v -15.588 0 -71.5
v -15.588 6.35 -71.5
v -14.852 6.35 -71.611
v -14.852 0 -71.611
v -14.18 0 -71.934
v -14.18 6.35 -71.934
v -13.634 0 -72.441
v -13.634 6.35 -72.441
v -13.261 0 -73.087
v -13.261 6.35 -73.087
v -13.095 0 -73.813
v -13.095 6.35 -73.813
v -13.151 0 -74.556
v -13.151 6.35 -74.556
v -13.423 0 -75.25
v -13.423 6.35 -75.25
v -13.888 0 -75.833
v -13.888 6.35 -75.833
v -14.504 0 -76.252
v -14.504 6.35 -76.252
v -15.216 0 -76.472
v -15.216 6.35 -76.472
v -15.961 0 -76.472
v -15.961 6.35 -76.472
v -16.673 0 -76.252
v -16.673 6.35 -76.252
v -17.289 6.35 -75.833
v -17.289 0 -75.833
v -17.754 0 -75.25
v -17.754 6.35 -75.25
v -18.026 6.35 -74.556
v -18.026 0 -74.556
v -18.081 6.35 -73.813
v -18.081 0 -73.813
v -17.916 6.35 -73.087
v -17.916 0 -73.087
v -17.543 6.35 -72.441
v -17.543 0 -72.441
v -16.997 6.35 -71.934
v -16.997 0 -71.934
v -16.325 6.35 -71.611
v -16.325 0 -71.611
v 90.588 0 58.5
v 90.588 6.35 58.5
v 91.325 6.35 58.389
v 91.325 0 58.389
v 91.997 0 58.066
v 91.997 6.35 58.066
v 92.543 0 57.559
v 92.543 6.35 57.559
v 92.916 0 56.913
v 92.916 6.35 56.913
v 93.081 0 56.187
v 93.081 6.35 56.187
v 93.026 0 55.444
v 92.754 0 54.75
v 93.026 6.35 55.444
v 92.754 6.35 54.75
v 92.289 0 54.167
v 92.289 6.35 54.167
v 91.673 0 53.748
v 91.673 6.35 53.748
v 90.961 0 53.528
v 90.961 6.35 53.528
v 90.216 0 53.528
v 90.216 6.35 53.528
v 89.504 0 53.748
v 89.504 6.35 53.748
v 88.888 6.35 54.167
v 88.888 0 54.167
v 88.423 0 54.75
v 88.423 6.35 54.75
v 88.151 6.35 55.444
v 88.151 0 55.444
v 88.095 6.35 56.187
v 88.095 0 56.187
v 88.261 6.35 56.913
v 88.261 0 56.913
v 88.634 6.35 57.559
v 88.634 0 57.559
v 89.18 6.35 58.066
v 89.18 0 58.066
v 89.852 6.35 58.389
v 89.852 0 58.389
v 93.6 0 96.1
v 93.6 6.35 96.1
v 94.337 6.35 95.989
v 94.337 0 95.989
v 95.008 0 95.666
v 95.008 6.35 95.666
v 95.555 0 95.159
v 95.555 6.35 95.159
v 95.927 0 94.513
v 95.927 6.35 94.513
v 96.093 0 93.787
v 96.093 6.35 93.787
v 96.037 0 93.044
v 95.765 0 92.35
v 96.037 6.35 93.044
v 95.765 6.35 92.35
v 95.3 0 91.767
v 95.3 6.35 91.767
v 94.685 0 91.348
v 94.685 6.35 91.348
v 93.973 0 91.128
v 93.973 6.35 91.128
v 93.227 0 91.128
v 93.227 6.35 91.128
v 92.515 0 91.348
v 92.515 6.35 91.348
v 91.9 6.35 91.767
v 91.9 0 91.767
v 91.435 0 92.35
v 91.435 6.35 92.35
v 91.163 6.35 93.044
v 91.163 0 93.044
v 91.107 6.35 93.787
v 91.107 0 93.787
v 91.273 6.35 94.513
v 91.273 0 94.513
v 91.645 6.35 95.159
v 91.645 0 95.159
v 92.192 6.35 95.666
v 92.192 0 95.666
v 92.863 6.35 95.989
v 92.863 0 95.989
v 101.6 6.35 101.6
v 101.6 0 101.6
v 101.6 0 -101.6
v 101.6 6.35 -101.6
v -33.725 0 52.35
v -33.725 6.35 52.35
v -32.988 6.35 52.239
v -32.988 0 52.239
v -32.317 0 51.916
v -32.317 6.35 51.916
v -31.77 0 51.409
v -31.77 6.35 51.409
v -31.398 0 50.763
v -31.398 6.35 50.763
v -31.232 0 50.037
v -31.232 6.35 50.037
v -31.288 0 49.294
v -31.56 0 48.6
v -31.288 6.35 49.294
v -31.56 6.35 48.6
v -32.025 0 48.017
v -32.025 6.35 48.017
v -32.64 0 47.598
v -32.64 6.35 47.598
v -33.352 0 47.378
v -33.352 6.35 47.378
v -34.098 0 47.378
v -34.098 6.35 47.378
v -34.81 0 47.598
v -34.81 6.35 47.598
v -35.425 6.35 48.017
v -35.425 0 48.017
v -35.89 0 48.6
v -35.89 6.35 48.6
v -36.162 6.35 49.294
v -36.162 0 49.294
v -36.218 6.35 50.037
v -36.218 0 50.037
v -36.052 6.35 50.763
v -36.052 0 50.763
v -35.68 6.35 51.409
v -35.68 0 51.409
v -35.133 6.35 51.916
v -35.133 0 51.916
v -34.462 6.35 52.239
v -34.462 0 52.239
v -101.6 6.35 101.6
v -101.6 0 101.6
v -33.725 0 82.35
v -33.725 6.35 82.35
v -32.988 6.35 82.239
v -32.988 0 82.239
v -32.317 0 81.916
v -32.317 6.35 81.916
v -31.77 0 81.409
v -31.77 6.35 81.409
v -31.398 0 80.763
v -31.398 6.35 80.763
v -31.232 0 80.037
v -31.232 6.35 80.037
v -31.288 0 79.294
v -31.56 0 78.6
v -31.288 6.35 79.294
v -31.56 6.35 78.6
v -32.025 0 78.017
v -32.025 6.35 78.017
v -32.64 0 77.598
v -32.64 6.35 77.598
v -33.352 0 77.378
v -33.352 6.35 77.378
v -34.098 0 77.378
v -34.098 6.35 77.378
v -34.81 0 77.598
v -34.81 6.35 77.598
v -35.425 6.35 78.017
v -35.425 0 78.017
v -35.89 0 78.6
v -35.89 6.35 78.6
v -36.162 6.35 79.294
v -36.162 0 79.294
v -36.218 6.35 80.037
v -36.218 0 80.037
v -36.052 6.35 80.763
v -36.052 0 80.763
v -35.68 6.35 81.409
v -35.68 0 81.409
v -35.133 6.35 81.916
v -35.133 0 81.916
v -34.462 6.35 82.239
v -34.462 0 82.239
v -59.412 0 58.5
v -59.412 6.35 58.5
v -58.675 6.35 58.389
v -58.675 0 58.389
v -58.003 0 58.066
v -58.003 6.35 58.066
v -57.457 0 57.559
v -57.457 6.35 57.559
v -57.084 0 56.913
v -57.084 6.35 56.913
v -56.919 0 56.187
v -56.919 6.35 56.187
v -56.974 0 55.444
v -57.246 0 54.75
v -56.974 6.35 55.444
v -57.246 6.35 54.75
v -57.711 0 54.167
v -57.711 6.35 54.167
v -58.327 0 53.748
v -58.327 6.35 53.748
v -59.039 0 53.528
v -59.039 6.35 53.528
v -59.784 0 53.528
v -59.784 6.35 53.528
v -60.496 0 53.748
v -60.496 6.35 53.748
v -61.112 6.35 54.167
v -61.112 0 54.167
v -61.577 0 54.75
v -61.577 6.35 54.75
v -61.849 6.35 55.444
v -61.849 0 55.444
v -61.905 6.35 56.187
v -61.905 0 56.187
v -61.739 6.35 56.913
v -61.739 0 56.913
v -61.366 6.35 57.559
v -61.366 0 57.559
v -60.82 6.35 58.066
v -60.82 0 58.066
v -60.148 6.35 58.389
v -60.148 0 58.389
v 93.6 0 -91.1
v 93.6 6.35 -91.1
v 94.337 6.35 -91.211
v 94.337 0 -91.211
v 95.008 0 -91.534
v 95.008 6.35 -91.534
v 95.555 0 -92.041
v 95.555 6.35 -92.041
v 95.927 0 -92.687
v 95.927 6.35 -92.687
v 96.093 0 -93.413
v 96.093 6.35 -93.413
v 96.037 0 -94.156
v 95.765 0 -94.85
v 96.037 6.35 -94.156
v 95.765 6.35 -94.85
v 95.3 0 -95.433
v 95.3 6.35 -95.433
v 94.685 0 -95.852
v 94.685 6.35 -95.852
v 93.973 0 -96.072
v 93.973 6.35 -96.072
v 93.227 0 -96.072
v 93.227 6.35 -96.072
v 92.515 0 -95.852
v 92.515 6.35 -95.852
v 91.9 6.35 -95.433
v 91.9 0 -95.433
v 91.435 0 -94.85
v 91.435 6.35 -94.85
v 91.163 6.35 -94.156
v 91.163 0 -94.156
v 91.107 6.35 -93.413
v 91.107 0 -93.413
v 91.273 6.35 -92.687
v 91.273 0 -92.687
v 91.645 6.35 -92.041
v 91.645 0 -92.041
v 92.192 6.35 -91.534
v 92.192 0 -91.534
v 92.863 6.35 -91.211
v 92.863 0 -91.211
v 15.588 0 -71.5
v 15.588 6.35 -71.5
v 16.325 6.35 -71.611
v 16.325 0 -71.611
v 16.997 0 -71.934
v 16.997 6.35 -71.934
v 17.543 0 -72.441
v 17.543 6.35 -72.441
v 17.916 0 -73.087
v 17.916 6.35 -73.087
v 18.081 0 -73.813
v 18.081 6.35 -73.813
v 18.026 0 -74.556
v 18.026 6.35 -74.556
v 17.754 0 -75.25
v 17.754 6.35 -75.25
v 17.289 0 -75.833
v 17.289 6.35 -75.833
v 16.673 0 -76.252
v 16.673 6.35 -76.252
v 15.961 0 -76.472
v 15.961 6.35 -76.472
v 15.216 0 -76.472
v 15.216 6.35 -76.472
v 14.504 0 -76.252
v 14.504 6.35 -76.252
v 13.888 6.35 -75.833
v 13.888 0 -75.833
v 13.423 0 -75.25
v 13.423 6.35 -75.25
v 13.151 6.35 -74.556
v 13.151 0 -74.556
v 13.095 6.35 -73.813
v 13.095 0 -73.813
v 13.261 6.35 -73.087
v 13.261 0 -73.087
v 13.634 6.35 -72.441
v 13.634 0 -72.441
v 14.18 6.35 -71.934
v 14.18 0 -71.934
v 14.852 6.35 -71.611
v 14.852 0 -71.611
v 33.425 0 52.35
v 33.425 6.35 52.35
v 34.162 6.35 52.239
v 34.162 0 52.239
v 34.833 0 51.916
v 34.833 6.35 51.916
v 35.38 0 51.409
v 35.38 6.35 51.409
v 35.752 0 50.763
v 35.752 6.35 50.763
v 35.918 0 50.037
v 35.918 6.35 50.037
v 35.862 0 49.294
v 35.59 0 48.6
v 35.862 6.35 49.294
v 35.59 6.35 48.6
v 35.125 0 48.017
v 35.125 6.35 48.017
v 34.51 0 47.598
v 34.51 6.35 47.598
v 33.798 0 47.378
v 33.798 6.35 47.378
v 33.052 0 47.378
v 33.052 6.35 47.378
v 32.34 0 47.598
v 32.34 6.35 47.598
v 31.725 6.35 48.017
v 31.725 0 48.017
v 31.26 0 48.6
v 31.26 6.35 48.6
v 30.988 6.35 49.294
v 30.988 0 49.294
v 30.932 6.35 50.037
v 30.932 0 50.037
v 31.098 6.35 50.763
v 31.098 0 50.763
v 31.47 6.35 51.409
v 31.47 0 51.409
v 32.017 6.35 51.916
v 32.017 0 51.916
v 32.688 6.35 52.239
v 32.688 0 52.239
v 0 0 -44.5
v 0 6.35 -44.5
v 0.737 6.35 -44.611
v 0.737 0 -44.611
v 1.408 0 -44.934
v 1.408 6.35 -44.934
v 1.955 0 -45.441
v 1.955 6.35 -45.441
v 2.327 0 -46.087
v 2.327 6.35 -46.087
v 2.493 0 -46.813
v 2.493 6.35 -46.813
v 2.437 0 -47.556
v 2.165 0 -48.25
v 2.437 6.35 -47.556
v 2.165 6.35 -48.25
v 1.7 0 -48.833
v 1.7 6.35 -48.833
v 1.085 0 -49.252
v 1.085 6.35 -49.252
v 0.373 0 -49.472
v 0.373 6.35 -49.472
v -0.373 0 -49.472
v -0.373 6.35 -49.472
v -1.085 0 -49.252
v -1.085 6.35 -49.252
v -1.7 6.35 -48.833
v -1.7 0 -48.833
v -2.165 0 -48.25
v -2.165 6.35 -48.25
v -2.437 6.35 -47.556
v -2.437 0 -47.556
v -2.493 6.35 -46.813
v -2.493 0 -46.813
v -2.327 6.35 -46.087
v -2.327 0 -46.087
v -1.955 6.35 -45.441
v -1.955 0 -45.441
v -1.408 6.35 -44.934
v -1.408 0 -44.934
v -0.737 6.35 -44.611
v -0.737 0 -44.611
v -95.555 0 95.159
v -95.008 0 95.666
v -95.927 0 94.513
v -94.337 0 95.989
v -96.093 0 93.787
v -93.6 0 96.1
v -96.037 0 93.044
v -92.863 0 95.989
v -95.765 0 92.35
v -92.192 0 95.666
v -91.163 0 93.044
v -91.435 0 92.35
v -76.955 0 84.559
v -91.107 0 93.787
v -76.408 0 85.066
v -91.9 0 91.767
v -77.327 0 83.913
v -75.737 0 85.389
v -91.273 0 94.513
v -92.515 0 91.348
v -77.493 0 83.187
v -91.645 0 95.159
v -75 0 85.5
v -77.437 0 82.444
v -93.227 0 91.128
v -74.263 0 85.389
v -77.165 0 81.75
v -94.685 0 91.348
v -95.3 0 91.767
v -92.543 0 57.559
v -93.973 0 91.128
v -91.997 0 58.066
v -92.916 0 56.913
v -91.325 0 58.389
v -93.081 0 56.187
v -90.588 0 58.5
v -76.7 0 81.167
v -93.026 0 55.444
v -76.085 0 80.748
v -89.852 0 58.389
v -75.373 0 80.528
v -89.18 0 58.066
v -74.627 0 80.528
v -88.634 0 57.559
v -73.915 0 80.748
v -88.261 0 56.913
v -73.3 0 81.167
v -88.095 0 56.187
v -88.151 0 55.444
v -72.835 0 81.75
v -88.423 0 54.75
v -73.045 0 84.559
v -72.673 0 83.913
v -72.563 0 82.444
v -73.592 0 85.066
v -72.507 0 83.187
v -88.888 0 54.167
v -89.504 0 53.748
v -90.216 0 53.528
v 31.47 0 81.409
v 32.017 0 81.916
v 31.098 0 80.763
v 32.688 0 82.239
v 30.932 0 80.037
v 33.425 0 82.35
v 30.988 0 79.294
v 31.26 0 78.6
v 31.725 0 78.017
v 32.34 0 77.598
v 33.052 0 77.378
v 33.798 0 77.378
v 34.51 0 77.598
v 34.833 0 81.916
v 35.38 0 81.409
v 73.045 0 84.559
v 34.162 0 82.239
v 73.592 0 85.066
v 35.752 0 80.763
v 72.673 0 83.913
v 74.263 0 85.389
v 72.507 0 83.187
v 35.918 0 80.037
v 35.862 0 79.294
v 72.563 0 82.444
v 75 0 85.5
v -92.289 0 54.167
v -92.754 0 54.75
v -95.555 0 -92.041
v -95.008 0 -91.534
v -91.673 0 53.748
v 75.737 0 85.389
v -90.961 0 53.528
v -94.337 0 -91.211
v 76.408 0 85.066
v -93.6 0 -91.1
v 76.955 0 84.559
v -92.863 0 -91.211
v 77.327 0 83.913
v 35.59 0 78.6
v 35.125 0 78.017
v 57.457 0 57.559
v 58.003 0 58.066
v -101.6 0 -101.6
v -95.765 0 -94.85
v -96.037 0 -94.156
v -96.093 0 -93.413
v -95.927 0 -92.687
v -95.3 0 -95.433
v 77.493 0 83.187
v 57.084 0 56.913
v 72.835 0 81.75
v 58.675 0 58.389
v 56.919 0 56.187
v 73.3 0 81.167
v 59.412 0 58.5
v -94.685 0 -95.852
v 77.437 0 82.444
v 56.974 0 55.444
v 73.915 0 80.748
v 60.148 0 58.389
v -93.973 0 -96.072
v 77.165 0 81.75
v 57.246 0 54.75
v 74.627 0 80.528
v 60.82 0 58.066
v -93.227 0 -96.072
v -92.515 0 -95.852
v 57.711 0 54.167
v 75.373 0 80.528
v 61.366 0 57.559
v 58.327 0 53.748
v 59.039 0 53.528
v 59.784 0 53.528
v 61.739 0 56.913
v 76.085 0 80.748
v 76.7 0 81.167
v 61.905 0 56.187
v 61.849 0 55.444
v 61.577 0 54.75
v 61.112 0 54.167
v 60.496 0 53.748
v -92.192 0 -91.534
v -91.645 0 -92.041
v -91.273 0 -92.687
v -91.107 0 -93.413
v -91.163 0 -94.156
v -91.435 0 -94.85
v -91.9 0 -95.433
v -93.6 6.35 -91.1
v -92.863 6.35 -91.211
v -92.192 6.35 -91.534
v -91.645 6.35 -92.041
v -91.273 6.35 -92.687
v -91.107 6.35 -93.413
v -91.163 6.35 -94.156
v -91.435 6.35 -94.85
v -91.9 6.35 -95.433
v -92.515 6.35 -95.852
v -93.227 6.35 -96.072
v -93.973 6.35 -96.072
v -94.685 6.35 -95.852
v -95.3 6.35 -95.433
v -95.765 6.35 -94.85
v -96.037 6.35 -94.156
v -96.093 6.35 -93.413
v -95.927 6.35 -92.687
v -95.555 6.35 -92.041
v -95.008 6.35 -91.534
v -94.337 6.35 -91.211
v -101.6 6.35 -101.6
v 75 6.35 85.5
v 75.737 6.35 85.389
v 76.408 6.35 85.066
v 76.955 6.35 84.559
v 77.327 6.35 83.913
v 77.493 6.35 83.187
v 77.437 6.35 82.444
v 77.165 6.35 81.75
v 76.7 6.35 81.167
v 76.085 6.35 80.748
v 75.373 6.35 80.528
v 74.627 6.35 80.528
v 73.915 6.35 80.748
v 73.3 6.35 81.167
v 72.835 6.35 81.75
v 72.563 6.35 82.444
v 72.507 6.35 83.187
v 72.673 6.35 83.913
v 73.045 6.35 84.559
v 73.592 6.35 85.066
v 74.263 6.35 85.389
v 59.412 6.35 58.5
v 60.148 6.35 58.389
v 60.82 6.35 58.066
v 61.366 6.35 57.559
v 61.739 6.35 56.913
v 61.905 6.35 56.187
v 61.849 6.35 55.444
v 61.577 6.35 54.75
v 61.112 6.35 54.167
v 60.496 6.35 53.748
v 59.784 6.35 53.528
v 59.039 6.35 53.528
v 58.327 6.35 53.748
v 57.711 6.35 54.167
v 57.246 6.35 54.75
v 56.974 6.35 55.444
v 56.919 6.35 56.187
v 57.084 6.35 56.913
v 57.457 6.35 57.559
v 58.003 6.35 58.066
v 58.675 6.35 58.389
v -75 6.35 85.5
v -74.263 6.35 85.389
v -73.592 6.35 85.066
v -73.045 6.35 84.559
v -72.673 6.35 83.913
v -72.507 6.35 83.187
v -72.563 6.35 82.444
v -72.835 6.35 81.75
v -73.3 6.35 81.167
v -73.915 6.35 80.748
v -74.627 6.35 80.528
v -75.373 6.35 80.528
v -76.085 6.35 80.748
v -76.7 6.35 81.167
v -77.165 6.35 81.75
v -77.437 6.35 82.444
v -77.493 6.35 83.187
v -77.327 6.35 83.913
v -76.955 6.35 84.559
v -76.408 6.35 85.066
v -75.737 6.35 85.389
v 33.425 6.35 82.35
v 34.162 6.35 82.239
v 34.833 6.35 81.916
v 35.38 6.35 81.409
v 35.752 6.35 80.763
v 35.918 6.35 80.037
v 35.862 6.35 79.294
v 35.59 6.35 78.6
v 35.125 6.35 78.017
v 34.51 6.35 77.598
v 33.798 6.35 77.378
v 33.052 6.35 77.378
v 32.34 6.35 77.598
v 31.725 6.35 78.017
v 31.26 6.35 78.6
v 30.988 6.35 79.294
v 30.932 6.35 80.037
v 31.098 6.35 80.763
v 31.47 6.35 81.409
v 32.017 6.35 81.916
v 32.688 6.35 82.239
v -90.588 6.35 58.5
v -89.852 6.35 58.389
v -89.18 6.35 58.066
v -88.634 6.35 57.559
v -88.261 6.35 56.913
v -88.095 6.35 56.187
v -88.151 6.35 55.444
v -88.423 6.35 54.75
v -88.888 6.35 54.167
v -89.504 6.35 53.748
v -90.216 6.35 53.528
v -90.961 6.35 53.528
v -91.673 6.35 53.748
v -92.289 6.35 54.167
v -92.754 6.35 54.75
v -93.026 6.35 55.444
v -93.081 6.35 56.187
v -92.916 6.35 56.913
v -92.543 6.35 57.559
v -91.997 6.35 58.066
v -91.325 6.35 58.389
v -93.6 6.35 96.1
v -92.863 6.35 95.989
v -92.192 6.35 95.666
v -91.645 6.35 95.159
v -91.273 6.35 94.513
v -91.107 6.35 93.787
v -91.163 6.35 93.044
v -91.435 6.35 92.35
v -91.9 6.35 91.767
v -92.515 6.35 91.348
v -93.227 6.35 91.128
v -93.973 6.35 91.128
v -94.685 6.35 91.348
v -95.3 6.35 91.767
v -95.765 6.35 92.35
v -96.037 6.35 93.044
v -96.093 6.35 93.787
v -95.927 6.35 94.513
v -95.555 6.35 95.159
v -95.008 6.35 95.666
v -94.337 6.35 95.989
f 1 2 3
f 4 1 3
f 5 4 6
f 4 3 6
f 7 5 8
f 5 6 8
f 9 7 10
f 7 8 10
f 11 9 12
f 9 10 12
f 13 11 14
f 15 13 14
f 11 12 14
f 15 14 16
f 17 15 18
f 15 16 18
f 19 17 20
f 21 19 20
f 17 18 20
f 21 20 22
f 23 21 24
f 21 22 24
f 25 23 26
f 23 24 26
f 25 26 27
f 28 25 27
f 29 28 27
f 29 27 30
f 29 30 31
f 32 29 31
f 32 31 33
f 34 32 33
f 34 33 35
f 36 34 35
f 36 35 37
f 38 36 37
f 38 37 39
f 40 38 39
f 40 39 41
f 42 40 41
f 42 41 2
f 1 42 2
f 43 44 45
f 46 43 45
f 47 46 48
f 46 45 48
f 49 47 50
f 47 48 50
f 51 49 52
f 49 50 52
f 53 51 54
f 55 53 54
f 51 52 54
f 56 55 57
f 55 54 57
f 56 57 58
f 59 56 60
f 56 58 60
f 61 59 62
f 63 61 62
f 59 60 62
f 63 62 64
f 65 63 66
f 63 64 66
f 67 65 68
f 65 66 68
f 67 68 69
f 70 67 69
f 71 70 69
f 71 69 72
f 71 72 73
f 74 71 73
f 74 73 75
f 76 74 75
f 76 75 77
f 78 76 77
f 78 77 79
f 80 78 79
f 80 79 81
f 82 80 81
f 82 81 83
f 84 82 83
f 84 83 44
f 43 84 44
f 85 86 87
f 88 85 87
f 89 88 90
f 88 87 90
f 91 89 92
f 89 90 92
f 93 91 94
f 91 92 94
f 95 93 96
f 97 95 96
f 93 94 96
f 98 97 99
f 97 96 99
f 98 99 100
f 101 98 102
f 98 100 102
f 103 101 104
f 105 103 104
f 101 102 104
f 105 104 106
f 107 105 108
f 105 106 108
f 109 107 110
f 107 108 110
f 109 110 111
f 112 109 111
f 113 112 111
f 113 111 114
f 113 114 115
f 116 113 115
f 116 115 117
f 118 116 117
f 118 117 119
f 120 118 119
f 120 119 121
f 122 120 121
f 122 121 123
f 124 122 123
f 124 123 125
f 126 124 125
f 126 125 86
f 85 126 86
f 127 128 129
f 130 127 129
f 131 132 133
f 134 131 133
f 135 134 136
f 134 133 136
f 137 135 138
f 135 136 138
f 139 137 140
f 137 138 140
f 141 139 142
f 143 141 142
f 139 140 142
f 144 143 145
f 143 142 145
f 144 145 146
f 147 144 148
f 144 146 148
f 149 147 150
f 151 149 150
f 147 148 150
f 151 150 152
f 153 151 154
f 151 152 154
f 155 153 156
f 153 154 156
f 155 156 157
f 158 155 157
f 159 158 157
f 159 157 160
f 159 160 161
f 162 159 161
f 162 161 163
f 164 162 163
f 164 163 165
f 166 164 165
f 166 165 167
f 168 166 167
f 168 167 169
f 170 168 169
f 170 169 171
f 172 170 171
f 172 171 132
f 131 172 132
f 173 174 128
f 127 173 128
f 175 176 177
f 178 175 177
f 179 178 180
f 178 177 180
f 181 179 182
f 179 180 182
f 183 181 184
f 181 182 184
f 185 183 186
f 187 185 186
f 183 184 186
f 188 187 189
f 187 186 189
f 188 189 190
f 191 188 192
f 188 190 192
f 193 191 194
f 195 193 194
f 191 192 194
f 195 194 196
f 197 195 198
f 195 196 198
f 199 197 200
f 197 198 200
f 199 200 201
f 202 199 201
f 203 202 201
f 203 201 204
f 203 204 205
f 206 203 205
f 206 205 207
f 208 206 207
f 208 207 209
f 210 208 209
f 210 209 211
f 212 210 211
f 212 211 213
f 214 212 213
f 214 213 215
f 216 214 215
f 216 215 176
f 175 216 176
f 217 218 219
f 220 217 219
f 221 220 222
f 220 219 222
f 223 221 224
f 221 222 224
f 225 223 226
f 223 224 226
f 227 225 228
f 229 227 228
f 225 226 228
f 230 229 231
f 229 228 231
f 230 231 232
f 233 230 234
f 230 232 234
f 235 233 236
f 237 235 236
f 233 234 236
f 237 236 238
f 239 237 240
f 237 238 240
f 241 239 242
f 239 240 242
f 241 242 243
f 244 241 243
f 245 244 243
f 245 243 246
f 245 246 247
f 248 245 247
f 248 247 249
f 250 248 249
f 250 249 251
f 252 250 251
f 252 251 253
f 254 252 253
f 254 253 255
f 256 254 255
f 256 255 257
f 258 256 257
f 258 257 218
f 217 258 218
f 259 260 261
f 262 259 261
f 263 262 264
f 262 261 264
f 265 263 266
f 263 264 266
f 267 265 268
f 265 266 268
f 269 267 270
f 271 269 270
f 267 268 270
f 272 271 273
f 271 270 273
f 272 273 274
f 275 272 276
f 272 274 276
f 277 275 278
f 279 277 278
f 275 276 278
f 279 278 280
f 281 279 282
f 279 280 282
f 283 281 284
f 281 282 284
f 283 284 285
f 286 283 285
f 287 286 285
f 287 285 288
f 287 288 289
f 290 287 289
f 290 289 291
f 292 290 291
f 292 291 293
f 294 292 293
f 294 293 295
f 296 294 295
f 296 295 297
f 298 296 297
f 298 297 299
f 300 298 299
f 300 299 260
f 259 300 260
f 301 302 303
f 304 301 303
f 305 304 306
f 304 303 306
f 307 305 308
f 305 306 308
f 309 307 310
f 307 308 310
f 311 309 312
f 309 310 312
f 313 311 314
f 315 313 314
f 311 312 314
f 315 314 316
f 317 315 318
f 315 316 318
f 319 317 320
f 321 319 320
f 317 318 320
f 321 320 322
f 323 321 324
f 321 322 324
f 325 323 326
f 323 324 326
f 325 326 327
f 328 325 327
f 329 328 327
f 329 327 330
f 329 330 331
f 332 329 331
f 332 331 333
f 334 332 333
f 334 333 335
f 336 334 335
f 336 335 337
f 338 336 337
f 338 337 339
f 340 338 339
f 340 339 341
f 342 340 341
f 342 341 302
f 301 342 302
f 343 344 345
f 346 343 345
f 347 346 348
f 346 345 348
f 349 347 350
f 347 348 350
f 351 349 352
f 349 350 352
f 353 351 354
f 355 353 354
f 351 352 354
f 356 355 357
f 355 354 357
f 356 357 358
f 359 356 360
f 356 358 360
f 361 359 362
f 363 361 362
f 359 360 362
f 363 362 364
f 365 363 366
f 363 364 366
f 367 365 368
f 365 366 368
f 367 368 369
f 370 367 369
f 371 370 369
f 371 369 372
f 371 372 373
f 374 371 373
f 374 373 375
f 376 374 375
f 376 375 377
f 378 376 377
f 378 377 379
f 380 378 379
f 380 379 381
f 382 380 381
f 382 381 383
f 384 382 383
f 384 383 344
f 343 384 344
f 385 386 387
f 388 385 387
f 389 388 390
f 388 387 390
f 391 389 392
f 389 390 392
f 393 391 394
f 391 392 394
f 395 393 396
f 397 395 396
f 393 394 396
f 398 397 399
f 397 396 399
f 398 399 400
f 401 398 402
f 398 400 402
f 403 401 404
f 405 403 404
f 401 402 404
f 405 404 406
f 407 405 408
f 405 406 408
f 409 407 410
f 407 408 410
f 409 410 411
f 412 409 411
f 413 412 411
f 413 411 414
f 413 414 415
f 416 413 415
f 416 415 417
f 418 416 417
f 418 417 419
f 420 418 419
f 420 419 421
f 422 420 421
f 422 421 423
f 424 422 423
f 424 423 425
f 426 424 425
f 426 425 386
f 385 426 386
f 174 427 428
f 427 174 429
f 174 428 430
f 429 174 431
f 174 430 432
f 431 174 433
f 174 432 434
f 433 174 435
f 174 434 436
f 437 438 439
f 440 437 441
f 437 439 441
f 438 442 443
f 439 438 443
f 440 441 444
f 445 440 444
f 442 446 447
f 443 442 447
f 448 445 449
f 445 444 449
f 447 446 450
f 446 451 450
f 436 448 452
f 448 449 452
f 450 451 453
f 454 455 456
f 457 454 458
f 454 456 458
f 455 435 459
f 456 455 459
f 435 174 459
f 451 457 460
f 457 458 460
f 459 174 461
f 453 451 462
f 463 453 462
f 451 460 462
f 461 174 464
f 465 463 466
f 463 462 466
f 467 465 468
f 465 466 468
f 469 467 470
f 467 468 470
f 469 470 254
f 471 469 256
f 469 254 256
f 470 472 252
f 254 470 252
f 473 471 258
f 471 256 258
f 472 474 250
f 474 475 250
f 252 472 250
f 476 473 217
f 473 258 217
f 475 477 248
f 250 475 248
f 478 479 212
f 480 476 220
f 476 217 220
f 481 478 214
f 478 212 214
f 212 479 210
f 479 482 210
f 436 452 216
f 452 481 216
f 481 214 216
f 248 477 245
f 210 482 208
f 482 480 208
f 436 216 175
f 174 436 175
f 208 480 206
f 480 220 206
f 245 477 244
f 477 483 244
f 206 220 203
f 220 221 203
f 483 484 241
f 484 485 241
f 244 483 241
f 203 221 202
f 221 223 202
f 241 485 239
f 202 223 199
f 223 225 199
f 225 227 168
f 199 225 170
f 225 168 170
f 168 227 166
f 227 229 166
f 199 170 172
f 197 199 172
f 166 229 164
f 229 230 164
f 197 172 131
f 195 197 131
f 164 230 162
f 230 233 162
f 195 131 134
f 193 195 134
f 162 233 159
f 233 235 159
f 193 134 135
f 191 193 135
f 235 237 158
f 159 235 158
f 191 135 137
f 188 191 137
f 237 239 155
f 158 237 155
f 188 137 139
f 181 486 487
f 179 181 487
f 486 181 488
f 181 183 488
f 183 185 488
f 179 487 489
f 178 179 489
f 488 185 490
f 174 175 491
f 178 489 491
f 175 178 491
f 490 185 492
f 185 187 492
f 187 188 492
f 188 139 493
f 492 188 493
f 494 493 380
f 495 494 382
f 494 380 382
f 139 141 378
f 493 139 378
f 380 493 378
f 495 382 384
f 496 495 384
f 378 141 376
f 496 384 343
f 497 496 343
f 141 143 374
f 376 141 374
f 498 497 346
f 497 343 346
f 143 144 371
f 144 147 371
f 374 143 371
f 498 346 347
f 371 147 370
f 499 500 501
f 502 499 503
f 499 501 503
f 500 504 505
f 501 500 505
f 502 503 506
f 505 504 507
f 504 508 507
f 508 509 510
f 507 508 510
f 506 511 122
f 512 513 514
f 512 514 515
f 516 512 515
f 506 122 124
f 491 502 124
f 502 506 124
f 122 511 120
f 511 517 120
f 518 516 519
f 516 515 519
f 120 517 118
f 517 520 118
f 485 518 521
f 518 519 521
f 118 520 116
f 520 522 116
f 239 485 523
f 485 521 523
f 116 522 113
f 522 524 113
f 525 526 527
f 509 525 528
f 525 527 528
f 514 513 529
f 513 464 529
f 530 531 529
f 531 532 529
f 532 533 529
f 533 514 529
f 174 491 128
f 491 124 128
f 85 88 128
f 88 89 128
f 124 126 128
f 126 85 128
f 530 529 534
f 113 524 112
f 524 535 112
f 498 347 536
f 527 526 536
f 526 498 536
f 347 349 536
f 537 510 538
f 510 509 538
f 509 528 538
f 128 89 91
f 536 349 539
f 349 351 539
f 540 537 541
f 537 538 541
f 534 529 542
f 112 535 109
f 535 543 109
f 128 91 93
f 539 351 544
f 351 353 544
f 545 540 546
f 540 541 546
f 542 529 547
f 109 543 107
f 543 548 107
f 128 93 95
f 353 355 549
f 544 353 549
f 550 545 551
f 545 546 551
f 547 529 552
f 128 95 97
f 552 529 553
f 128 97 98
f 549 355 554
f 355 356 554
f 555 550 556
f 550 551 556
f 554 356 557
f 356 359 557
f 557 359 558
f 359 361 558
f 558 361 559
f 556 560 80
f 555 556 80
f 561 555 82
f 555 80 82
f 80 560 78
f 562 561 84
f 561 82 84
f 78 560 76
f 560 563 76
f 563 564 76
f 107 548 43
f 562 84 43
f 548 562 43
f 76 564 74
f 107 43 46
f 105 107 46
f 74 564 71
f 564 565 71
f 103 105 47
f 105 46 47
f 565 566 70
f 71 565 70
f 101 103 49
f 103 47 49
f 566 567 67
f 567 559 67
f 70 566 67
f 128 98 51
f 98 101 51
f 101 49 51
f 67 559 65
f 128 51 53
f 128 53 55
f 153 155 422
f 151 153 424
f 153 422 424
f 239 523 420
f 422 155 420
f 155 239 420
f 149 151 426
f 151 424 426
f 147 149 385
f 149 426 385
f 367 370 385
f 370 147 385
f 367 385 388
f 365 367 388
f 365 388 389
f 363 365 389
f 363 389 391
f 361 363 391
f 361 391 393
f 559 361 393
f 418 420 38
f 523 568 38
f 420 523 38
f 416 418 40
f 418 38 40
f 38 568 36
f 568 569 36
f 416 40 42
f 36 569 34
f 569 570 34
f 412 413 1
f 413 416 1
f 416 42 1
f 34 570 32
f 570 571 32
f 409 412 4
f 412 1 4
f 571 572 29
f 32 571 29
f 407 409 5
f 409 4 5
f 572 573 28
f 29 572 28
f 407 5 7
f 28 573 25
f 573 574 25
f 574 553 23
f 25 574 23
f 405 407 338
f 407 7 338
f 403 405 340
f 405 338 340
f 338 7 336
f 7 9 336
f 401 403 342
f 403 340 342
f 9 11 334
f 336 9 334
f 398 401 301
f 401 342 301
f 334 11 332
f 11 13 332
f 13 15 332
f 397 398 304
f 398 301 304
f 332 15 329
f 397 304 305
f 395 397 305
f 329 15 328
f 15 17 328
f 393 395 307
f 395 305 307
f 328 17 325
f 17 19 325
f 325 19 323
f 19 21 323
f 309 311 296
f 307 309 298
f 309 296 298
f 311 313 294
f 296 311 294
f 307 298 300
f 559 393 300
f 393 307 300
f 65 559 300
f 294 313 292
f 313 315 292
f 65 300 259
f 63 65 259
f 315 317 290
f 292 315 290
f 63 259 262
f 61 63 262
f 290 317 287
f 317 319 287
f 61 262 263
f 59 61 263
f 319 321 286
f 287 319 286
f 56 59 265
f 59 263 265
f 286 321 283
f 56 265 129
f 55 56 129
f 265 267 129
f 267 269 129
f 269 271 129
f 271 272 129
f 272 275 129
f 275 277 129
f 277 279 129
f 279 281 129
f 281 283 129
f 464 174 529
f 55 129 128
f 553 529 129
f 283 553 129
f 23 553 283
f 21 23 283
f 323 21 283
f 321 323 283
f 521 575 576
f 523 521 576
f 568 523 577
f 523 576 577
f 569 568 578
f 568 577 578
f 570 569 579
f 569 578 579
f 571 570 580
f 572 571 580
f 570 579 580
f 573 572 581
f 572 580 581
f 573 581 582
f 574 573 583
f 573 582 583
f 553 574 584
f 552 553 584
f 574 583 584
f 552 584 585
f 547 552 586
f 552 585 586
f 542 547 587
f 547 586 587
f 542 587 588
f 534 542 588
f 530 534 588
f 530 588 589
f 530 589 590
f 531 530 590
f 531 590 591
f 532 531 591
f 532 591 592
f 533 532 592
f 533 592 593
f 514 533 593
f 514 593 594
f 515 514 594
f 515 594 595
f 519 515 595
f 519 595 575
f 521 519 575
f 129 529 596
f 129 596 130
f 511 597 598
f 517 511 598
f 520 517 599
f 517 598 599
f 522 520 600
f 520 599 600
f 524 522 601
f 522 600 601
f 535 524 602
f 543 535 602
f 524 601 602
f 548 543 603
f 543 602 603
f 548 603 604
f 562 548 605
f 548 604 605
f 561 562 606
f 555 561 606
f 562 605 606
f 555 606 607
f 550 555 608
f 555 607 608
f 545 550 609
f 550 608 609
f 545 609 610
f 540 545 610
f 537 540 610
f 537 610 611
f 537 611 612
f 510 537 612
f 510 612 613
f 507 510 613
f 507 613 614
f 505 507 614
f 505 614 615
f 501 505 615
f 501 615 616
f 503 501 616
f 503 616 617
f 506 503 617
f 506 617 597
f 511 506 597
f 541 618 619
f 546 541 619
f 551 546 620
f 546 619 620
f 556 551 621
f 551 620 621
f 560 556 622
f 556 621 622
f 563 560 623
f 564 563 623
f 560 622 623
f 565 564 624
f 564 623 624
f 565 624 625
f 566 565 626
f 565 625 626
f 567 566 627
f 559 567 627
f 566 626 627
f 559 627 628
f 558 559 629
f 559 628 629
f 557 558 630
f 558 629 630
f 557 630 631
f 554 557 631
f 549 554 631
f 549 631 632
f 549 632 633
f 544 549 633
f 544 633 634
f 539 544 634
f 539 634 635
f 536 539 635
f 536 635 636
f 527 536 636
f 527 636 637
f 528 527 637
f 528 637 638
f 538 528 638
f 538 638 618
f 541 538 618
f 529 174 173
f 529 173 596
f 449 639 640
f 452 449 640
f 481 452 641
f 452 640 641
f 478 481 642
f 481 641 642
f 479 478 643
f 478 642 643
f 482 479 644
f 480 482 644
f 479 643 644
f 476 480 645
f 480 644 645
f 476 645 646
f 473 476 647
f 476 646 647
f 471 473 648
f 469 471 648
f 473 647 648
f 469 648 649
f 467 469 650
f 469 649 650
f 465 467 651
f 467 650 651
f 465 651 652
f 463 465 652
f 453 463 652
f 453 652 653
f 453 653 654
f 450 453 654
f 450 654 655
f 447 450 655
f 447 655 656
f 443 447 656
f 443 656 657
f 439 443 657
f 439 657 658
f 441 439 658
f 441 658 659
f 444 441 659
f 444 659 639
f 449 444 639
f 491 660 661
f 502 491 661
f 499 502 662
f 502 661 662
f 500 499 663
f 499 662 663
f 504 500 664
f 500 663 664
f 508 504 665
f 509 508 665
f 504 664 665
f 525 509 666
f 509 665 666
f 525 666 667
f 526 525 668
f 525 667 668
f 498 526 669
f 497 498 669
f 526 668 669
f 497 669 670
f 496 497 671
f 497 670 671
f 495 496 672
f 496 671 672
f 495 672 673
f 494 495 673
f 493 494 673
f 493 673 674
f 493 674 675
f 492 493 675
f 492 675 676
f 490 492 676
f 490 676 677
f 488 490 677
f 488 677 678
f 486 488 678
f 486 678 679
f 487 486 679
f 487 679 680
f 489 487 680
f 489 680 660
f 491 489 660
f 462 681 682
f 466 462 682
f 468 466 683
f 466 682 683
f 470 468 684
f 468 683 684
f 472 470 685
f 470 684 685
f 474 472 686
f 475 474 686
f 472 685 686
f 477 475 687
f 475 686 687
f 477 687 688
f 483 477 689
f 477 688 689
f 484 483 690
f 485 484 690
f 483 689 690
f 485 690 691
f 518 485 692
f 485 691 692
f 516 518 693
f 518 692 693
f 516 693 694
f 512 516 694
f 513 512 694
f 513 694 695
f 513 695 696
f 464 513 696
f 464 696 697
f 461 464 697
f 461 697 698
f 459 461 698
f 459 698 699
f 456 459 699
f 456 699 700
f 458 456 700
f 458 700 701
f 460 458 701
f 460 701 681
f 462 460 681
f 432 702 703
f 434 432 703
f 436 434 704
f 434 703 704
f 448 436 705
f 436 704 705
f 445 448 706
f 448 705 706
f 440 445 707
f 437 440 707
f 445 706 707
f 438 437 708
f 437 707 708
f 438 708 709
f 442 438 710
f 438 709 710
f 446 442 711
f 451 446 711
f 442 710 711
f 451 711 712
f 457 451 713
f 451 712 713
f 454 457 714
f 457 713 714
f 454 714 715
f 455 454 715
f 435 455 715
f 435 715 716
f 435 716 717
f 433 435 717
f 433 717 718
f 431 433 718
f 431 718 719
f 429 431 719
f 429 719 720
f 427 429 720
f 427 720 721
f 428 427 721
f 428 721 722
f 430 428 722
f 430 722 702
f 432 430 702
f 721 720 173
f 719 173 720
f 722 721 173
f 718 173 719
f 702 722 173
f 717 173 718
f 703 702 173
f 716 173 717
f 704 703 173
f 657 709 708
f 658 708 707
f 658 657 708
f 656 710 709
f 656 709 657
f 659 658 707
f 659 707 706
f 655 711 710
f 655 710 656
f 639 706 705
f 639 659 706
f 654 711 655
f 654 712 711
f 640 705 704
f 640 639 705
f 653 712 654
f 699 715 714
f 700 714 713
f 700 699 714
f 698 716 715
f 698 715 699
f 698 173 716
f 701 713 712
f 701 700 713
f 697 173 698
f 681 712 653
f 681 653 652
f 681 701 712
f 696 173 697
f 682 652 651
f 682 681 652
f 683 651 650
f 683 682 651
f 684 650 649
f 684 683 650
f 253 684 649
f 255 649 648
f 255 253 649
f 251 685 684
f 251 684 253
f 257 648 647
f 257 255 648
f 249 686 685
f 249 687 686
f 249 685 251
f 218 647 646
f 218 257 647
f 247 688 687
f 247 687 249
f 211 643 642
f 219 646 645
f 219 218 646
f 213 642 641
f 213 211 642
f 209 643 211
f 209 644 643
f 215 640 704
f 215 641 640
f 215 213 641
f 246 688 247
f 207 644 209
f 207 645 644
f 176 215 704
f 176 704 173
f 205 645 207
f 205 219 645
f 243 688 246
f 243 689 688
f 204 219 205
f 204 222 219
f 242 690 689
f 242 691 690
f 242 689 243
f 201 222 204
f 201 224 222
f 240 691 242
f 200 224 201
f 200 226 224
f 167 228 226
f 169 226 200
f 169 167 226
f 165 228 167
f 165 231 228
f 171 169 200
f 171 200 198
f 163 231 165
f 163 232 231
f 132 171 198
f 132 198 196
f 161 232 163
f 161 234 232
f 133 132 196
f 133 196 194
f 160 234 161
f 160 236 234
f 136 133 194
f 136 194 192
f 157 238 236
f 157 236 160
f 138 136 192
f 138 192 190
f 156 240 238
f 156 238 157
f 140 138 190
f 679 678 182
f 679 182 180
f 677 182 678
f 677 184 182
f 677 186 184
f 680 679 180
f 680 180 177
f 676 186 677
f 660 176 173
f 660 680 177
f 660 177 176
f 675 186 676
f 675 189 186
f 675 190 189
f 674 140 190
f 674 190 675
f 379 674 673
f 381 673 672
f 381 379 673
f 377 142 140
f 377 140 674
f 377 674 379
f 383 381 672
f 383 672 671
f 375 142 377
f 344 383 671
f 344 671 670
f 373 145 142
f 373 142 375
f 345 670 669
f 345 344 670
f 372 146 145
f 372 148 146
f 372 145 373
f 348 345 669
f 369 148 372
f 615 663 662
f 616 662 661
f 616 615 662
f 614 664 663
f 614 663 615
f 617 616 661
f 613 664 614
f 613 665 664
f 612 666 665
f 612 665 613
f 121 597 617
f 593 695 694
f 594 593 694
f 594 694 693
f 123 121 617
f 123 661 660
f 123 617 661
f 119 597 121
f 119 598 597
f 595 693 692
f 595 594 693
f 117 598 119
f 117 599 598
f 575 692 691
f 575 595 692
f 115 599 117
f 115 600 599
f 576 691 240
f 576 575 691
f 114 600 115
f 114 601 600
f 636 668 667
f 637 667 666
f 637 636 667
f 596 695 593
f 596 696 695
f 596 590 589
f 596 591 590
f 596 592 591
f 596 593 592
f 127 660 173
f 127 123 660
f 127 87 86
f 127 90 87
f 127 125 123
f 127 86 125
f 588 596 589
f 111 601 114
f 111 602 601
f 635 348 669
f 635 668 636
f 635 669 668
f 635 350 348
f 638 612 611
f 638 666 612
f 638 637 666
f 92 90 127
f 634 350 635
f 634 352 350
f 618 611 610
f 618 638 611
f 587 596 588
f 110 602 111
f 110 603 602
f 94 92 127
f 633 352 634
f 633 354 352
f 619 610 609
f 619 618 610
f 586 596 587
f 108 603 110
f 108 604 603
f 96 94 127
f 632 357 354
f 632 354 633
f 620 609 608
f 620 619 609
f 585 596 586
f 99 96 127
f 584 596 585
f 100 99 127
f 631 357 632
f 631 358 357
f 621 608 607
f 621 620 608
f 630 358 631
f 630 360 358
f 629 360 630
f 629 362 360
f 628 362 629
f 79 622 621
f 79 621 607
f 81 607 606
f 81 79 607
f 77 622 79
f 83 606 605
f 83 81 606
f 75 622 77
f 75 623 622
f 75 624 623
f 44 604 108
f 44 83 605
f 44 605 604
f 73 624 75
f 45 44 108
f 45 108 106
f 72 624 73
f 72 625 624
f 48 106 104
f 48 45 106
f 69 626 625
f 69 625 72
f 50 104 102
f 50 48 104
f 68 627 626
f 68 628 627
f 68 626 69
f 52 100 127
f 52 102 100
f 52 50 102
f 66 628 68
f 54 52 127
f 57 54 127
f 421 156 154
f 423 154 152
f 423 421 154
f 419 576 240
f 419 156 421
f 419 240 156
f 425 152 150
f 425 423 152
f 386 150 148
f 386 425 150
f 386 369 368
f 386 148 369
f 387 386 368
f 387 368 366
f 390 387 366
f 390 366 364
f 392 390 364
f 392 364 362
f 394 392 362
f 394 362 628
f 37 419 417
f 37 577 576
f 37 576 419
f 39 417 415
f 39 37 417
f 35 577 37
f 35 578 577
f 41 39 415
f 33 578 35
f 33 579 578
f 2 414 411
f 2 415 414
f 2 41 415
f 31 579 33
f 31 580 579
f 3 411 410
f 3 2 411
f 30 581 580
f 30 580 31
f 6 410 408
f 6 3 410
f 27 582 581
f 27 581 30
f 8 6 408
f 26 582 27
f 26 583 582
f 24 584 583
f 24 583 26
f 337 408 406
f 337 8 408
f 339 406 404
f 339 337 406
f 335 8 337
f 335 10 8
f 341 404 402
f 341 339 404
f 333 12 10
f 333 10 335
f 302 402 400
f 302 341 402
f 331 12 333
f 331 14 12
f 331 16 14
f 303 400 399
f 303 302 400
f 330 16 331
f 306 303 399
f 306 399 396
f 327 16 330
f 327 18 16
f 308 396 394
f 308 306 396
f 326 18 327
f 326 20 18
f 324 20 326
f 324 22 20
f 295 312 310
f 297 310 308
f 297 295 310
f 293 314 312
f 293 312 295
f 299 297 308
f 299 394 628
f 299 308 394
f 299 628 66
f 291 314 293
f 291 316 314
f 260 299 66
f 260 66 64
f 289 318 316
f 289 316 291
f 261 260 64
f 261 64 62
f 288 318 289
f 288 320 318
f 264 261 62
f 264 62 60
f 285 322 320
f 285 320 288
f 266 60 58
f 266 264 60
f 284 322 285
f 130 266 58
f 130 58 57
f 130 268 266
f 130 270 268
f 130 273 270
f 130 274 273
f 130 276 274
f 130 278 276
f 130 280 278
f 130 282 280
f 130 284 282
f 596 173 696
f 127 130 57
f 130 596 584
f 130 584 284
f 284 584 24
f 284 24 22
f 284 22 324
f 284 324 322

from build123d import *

# Parameters (mm, degrees)
ESQUISSE1_W             = 203.2
ESQUISSE1_H             = 203.2
BOSS_EXTRU_1_DEPTH      = 6.35
ESQUISSE2_R             = 2.5
ENL_V_MAT_EXTRU_1_DEPTH = 144.824345992
ESQUISSE3_R             = 2.5
ENL_V_MAT_EXTRU_2_DEPTH = 144.824345992
ESQUISSE4_R             = 2.5
ENL_V_MAT_EXTRU_3_DEPTH = 144.824345992


with BuildPart() as part:
    # Esquisse1 → Boss.-Extru.1 (new body)
    with BuildSketch(Plane(origin=(0, 0, 0), x_dir=(1, 0, 0), z_dir=(0, 1, 0))):
        Rectangle(ESQUISSE1_W, ESQUISSE1_H)
    extrude(amount=BOSS_EXTRU_1_DEPTH)

    # Esquisse2 → Enlèv. mat.-Extru.1 (cut, through all)
    with BuildSketch(Plane(origin=(0, 6.35, 0), x_dir=(1, 0, 0), z_dir=(0, 1, 0))):
        with Locations(Location((-33.725, -49.85, 0), (0, 0, 270))):
            Circle(ESQUISSE2_R)
        with Locations(Location((-33.725, -79.85, 0), (0, 0, 270))):
            Circle(ESQUISSE2_R)
        with Locations(Location((33.425, -79.85, 0), (0, 0, 270))):
            Circle(ESQUISSE2_R)
        with Locations(Location((33.425, -49.85, 0), (0, 0, 270))):
            Circle(ESQUISSE2_R)
    extrude(amount=-ENL_V_MAT_EXTRU_1_DEPTH, mode=Mode.SUBTRACT)

    # Esquisse3 → Enlèv. mat.-Extru.2 (cut, through all)
    with BuildSketch(Plane(origin=(0, 6.35, 0), x_dir=(1, 0, 0), z_dir=(0, 1, 0))):
        with Locations(Location((-93.6, 93.6, 0), (0, 0, 270))):
            Circle(ESQUISSE3_R)
        with Locations(Location((93.6, 93.6, 0), (0, 0, 270))):
            Circle(ESQUISSE3_R)
        with Locations(Location((93.6, -93.6, 0), (0, 0, 270))):
            Circle(ESQUISSE3_R)
        with Locations(Location((-93.6, -93.6, 0), (0, 0, 270))):
            Circle(ESQUISSE3_R)
    extrude(amount=-ENL_V_MAT_EXTRU_2_DEPTH, mode=Mode.SUBTRACT)

    # Esquisse4 → Enlèv. mat.-Extru.3 (cut, through all)
    with BuildSketch(Plane(origin=(0, 6.35, 0), x_dir=(1, 0, 0), z_dir=(0, 1, 0))):
        with Locations(Location((-15.588457268, 74, 0), (0, 0, 270))):
            Circle(ESQUISSE4_R)
        with Locations(Location((15.588457268, 74, 0), (0, 0, 270))):
            Circle(ESQUISSE4_R)
        with Locations(Location((0, 47, 0), (0, 0, 270))):
            Circle(ESQUISSE4_R)
        with Locations(Location((-75, -83, 0), (0, 0, 270))):
            Circle(ESQUISSE4_R)
        with Locations(Location((-90.588457268, -56, 0), (0, 0, 270))):
            Circle(ESQUISSE4_R)
        with Locations(Location((-59.411542732, -56, 0), (0, 0, 270))):
            Circle(ESQUISSE4_R)
        with Locations(Location((59.411542732, -56, 0), (0, 0, 270))):
            Circle(ESQUISSE4_R)
        with Locations(Location((90.588457268, -56, 0), (0, 0, 270))):
            Circle(ESQUISSE4_R)
        with Locations(Location((75, -83, 0), (0, 0, 270))):
            Circle(ESQUISSE4_R)
    extrude(amount=-ENL_V_MAT_EXTRU_3_DEPTH, mode=Mode.SUBTRACT)


solid = part.part
